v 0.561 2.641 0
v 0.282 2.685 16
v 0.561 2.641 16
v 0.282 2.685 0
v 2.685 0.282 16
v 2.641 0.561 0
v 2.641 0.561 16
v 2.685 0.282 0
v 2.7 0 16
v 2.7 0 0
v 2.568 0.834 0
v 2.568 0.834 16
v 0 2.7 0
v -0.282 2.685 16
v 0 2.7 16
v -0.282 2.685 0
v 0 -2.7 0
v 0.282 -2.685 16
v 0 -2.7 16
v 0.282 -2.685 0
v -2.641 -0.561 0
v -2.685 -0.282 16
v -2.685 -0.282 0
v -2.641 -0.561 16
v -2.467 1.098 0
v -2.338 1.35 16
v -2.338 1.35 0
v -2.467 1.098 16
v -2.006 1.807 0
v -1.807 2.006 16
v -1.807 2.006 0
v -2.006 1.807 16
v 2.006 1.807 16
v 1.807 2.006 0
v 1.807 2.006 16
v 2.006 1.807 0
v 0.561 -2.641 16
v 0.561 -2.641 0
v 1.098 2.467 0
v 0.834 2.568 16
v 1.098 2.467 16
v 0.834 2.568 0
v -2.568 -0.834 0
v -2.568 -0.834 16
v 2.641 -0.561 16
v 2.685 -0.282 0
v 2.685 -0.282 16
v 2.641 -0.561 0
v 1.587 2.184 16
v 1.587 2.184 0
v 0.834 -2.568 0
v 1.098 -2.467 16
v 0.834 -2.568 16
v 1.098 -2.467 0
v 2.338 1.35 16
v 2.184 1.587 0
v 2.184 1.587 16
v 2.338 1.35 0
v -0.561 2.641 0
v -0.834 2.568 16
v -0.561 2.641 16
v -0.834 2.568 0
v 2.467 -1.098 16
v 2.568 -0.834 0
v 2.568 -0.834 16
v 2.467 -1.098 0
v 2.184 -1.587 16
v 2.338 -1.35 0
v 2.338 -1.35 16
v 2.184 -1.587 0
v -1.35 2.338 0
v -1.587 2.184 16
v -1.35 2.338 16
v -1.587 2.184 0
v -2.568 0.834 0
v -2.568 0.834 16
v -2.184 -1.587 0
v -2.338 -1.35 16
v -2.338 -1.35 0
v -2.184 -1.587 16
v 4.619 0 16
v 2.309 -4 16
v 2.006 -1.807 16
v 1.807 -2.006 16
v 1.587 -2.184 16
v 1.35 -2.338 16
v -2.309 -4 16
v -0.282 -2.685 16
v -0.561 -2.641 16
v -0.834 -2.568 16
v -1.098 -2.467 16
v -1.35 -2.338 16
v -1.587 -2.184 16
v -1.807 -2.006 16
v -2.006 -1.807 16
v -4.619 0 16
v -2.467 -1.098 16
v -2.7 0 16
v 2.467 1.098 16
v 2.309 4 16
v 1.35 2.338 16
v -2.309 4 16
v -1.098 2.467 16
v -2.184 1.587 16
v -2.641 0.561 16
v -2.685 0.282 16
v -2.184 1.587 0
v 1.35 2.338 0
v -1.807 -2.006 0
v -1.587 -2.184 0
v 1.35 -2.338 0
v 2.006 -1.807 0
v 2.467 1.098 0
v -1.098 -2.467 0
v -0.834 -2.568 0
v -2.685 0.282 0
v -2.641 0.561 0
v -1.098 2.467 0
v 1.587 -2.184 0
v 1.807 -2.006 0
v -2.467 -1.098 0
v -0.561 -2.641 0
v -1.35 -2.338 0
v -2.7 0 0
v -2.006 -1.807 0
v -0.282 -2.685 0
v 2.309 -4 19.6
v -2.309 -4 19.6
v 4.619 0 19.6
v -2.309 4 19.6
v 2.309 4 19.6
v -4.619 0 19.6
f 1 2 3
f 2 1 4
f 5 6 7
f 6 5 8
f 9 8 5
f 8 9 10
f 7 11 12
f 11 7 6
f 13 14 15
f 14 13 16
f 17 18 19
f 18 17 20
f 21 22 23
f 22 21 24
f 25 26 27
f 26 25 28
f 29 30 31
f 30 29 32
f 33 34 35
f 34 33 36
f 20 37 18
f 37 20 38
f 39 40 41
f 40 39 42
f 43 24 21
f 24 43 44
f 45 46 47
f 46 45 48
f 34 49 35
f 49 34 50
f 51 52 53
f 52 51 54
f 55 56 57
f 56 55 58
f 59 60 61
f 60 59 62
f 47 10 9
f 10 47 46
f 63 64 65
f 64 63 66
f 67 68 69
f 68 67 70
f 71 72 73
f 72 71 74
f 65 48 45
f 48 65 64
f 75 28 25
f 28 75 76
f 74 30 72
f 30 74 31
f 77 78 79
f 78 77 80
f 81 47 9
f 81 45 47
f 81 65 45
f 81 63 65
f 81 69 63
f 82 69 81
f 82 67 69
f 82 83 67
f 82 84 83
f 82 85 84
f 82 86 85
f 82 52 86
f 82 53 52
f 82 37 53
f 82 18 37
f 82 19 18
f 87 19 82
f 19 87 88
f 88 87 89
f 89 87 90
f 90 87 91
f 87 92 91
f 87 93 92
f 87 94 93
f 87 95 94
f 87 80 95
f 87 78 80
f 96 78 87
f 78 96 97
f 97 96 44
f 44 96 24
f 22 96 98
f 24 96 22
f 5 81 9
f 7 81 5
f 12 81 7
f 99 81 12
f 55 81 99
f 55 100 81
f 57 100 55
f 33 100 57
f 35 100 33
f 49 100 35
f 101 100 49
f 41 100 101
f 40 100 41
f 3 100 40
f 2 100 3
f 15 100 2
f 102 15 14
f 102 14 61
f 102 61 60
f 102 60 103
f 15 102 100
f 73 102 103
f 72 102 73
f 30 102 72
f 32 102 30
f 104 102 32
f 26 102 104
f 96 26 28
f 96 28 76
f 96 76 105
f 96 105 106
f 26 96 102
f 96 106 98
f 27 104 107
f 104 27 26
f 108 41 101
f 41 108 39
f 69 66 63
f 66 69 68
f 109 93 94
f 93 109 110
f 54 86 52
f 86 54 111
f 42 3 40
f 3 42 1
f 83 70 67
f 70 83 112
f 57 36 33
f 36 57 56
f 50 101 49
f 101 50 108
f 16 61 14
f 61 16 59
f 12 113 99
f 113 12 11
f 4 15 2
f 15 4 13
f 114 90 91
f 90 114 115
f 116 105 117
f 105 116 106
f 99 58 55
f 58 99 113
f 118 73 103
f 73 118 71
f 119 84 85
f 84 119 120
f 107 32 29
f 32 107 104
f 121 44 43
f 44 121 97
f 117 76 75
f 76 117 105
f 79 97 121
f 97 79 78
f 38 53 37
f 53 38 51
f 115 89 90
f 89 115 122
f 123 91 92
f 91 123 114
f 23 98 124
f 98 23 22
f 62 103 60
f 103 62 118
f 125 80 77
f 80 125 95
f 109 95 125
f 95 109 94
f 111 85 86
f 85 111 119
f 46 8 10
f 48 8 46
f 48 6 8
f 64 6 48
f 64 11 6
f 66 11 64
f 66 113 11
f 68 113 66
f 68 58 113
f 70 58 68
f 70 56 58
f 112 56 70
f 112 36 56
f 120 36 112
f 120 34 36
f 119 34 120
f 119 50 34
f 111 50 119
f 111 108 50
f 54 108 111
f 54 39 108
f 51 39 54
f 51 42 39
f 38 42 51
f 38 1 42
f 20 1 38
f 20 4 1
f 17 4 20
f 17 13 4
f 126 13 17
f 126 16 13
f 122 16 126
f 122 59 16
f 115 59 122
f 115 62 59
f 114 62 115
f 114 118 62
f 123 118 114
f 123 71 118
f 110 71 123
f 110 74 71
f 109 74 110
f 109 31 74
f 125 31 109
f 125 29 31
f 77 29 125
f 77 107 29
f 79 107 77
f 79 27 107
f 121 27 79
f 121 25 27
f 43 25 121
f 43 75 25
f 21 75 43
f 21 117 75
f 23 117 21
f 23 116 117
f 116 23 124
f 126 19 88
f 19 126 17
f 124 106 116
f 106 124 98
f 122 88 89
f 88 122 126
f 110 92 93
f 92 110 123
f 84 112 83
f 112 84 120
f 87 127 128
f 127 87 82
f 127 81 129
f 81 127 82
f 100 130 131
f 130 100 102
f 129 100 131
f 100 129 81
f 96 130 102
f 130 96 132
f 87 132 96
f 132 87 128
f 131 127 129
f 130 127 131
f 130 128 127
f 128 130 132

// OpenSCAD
// Hex-head bolt.
$fn = 60;
eps = 0.02;
thread_d = 5.4;
flat = 8;
shaft_l = 16;
union() { cylinder(d=thread_d,h=shaft_l); translate([0,0,shaft_l]) cylinder(d=flat/cos(30),h=flat*0.45,$fn=6); }
